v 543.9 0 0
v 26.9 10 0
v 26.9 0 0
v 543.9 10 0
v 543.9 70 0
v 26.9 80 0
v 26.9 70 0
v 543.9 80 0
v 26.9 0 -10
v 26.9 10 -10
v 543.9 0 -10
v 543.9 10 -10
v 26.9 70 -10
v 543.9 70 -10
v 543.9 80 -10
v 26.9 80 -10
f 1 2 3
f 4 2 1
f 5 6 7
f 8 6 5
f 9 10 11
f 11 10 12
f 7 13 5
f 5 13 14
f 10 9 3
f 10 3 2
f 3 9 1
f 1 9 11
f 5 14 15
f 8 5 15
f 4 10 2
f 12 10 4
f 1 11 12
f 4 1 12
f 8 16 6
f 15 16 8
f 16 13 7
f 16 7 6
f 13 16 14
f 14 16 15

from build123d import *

# Parameters (mm, degrees)
BOX008_W     = 517
BOX008_H     = 10
BOX008_DEPTH = 10
BOX011_W     = 517
BOX011_H     = 10
BOX011_DEPTH = 10


with BuildPart() as box008:
    # Box008 → Box008 (new body)
    with BuildSketch(Plane(origin=(26.9, 0, -10), x_dir=(1, 0, 0), z_dir=(0, 0, 1))):
        with Locations((258.5, 5)):
            Rectangle(BOX008_W, BOX008_H)
    extrude(amount=BOX008_DEPTH)


with BuildPart() as kipper_frame_metal:
    # Box011 → Box011 (new body)
    with BuildSketch(Plane(origin=(26.9, 70, -10), x_dir=(1, 0, 0), z_dir=(0, 0, 1))):
        with Locations((258.5, 5)):
            Rectangle(BOX011_W, BOX011_H)
    extrude(amount=BOX011_DEPTH)

    # Fusion034: union Box008
    add(box008.part)


solid = kipper_frame_metal.part
